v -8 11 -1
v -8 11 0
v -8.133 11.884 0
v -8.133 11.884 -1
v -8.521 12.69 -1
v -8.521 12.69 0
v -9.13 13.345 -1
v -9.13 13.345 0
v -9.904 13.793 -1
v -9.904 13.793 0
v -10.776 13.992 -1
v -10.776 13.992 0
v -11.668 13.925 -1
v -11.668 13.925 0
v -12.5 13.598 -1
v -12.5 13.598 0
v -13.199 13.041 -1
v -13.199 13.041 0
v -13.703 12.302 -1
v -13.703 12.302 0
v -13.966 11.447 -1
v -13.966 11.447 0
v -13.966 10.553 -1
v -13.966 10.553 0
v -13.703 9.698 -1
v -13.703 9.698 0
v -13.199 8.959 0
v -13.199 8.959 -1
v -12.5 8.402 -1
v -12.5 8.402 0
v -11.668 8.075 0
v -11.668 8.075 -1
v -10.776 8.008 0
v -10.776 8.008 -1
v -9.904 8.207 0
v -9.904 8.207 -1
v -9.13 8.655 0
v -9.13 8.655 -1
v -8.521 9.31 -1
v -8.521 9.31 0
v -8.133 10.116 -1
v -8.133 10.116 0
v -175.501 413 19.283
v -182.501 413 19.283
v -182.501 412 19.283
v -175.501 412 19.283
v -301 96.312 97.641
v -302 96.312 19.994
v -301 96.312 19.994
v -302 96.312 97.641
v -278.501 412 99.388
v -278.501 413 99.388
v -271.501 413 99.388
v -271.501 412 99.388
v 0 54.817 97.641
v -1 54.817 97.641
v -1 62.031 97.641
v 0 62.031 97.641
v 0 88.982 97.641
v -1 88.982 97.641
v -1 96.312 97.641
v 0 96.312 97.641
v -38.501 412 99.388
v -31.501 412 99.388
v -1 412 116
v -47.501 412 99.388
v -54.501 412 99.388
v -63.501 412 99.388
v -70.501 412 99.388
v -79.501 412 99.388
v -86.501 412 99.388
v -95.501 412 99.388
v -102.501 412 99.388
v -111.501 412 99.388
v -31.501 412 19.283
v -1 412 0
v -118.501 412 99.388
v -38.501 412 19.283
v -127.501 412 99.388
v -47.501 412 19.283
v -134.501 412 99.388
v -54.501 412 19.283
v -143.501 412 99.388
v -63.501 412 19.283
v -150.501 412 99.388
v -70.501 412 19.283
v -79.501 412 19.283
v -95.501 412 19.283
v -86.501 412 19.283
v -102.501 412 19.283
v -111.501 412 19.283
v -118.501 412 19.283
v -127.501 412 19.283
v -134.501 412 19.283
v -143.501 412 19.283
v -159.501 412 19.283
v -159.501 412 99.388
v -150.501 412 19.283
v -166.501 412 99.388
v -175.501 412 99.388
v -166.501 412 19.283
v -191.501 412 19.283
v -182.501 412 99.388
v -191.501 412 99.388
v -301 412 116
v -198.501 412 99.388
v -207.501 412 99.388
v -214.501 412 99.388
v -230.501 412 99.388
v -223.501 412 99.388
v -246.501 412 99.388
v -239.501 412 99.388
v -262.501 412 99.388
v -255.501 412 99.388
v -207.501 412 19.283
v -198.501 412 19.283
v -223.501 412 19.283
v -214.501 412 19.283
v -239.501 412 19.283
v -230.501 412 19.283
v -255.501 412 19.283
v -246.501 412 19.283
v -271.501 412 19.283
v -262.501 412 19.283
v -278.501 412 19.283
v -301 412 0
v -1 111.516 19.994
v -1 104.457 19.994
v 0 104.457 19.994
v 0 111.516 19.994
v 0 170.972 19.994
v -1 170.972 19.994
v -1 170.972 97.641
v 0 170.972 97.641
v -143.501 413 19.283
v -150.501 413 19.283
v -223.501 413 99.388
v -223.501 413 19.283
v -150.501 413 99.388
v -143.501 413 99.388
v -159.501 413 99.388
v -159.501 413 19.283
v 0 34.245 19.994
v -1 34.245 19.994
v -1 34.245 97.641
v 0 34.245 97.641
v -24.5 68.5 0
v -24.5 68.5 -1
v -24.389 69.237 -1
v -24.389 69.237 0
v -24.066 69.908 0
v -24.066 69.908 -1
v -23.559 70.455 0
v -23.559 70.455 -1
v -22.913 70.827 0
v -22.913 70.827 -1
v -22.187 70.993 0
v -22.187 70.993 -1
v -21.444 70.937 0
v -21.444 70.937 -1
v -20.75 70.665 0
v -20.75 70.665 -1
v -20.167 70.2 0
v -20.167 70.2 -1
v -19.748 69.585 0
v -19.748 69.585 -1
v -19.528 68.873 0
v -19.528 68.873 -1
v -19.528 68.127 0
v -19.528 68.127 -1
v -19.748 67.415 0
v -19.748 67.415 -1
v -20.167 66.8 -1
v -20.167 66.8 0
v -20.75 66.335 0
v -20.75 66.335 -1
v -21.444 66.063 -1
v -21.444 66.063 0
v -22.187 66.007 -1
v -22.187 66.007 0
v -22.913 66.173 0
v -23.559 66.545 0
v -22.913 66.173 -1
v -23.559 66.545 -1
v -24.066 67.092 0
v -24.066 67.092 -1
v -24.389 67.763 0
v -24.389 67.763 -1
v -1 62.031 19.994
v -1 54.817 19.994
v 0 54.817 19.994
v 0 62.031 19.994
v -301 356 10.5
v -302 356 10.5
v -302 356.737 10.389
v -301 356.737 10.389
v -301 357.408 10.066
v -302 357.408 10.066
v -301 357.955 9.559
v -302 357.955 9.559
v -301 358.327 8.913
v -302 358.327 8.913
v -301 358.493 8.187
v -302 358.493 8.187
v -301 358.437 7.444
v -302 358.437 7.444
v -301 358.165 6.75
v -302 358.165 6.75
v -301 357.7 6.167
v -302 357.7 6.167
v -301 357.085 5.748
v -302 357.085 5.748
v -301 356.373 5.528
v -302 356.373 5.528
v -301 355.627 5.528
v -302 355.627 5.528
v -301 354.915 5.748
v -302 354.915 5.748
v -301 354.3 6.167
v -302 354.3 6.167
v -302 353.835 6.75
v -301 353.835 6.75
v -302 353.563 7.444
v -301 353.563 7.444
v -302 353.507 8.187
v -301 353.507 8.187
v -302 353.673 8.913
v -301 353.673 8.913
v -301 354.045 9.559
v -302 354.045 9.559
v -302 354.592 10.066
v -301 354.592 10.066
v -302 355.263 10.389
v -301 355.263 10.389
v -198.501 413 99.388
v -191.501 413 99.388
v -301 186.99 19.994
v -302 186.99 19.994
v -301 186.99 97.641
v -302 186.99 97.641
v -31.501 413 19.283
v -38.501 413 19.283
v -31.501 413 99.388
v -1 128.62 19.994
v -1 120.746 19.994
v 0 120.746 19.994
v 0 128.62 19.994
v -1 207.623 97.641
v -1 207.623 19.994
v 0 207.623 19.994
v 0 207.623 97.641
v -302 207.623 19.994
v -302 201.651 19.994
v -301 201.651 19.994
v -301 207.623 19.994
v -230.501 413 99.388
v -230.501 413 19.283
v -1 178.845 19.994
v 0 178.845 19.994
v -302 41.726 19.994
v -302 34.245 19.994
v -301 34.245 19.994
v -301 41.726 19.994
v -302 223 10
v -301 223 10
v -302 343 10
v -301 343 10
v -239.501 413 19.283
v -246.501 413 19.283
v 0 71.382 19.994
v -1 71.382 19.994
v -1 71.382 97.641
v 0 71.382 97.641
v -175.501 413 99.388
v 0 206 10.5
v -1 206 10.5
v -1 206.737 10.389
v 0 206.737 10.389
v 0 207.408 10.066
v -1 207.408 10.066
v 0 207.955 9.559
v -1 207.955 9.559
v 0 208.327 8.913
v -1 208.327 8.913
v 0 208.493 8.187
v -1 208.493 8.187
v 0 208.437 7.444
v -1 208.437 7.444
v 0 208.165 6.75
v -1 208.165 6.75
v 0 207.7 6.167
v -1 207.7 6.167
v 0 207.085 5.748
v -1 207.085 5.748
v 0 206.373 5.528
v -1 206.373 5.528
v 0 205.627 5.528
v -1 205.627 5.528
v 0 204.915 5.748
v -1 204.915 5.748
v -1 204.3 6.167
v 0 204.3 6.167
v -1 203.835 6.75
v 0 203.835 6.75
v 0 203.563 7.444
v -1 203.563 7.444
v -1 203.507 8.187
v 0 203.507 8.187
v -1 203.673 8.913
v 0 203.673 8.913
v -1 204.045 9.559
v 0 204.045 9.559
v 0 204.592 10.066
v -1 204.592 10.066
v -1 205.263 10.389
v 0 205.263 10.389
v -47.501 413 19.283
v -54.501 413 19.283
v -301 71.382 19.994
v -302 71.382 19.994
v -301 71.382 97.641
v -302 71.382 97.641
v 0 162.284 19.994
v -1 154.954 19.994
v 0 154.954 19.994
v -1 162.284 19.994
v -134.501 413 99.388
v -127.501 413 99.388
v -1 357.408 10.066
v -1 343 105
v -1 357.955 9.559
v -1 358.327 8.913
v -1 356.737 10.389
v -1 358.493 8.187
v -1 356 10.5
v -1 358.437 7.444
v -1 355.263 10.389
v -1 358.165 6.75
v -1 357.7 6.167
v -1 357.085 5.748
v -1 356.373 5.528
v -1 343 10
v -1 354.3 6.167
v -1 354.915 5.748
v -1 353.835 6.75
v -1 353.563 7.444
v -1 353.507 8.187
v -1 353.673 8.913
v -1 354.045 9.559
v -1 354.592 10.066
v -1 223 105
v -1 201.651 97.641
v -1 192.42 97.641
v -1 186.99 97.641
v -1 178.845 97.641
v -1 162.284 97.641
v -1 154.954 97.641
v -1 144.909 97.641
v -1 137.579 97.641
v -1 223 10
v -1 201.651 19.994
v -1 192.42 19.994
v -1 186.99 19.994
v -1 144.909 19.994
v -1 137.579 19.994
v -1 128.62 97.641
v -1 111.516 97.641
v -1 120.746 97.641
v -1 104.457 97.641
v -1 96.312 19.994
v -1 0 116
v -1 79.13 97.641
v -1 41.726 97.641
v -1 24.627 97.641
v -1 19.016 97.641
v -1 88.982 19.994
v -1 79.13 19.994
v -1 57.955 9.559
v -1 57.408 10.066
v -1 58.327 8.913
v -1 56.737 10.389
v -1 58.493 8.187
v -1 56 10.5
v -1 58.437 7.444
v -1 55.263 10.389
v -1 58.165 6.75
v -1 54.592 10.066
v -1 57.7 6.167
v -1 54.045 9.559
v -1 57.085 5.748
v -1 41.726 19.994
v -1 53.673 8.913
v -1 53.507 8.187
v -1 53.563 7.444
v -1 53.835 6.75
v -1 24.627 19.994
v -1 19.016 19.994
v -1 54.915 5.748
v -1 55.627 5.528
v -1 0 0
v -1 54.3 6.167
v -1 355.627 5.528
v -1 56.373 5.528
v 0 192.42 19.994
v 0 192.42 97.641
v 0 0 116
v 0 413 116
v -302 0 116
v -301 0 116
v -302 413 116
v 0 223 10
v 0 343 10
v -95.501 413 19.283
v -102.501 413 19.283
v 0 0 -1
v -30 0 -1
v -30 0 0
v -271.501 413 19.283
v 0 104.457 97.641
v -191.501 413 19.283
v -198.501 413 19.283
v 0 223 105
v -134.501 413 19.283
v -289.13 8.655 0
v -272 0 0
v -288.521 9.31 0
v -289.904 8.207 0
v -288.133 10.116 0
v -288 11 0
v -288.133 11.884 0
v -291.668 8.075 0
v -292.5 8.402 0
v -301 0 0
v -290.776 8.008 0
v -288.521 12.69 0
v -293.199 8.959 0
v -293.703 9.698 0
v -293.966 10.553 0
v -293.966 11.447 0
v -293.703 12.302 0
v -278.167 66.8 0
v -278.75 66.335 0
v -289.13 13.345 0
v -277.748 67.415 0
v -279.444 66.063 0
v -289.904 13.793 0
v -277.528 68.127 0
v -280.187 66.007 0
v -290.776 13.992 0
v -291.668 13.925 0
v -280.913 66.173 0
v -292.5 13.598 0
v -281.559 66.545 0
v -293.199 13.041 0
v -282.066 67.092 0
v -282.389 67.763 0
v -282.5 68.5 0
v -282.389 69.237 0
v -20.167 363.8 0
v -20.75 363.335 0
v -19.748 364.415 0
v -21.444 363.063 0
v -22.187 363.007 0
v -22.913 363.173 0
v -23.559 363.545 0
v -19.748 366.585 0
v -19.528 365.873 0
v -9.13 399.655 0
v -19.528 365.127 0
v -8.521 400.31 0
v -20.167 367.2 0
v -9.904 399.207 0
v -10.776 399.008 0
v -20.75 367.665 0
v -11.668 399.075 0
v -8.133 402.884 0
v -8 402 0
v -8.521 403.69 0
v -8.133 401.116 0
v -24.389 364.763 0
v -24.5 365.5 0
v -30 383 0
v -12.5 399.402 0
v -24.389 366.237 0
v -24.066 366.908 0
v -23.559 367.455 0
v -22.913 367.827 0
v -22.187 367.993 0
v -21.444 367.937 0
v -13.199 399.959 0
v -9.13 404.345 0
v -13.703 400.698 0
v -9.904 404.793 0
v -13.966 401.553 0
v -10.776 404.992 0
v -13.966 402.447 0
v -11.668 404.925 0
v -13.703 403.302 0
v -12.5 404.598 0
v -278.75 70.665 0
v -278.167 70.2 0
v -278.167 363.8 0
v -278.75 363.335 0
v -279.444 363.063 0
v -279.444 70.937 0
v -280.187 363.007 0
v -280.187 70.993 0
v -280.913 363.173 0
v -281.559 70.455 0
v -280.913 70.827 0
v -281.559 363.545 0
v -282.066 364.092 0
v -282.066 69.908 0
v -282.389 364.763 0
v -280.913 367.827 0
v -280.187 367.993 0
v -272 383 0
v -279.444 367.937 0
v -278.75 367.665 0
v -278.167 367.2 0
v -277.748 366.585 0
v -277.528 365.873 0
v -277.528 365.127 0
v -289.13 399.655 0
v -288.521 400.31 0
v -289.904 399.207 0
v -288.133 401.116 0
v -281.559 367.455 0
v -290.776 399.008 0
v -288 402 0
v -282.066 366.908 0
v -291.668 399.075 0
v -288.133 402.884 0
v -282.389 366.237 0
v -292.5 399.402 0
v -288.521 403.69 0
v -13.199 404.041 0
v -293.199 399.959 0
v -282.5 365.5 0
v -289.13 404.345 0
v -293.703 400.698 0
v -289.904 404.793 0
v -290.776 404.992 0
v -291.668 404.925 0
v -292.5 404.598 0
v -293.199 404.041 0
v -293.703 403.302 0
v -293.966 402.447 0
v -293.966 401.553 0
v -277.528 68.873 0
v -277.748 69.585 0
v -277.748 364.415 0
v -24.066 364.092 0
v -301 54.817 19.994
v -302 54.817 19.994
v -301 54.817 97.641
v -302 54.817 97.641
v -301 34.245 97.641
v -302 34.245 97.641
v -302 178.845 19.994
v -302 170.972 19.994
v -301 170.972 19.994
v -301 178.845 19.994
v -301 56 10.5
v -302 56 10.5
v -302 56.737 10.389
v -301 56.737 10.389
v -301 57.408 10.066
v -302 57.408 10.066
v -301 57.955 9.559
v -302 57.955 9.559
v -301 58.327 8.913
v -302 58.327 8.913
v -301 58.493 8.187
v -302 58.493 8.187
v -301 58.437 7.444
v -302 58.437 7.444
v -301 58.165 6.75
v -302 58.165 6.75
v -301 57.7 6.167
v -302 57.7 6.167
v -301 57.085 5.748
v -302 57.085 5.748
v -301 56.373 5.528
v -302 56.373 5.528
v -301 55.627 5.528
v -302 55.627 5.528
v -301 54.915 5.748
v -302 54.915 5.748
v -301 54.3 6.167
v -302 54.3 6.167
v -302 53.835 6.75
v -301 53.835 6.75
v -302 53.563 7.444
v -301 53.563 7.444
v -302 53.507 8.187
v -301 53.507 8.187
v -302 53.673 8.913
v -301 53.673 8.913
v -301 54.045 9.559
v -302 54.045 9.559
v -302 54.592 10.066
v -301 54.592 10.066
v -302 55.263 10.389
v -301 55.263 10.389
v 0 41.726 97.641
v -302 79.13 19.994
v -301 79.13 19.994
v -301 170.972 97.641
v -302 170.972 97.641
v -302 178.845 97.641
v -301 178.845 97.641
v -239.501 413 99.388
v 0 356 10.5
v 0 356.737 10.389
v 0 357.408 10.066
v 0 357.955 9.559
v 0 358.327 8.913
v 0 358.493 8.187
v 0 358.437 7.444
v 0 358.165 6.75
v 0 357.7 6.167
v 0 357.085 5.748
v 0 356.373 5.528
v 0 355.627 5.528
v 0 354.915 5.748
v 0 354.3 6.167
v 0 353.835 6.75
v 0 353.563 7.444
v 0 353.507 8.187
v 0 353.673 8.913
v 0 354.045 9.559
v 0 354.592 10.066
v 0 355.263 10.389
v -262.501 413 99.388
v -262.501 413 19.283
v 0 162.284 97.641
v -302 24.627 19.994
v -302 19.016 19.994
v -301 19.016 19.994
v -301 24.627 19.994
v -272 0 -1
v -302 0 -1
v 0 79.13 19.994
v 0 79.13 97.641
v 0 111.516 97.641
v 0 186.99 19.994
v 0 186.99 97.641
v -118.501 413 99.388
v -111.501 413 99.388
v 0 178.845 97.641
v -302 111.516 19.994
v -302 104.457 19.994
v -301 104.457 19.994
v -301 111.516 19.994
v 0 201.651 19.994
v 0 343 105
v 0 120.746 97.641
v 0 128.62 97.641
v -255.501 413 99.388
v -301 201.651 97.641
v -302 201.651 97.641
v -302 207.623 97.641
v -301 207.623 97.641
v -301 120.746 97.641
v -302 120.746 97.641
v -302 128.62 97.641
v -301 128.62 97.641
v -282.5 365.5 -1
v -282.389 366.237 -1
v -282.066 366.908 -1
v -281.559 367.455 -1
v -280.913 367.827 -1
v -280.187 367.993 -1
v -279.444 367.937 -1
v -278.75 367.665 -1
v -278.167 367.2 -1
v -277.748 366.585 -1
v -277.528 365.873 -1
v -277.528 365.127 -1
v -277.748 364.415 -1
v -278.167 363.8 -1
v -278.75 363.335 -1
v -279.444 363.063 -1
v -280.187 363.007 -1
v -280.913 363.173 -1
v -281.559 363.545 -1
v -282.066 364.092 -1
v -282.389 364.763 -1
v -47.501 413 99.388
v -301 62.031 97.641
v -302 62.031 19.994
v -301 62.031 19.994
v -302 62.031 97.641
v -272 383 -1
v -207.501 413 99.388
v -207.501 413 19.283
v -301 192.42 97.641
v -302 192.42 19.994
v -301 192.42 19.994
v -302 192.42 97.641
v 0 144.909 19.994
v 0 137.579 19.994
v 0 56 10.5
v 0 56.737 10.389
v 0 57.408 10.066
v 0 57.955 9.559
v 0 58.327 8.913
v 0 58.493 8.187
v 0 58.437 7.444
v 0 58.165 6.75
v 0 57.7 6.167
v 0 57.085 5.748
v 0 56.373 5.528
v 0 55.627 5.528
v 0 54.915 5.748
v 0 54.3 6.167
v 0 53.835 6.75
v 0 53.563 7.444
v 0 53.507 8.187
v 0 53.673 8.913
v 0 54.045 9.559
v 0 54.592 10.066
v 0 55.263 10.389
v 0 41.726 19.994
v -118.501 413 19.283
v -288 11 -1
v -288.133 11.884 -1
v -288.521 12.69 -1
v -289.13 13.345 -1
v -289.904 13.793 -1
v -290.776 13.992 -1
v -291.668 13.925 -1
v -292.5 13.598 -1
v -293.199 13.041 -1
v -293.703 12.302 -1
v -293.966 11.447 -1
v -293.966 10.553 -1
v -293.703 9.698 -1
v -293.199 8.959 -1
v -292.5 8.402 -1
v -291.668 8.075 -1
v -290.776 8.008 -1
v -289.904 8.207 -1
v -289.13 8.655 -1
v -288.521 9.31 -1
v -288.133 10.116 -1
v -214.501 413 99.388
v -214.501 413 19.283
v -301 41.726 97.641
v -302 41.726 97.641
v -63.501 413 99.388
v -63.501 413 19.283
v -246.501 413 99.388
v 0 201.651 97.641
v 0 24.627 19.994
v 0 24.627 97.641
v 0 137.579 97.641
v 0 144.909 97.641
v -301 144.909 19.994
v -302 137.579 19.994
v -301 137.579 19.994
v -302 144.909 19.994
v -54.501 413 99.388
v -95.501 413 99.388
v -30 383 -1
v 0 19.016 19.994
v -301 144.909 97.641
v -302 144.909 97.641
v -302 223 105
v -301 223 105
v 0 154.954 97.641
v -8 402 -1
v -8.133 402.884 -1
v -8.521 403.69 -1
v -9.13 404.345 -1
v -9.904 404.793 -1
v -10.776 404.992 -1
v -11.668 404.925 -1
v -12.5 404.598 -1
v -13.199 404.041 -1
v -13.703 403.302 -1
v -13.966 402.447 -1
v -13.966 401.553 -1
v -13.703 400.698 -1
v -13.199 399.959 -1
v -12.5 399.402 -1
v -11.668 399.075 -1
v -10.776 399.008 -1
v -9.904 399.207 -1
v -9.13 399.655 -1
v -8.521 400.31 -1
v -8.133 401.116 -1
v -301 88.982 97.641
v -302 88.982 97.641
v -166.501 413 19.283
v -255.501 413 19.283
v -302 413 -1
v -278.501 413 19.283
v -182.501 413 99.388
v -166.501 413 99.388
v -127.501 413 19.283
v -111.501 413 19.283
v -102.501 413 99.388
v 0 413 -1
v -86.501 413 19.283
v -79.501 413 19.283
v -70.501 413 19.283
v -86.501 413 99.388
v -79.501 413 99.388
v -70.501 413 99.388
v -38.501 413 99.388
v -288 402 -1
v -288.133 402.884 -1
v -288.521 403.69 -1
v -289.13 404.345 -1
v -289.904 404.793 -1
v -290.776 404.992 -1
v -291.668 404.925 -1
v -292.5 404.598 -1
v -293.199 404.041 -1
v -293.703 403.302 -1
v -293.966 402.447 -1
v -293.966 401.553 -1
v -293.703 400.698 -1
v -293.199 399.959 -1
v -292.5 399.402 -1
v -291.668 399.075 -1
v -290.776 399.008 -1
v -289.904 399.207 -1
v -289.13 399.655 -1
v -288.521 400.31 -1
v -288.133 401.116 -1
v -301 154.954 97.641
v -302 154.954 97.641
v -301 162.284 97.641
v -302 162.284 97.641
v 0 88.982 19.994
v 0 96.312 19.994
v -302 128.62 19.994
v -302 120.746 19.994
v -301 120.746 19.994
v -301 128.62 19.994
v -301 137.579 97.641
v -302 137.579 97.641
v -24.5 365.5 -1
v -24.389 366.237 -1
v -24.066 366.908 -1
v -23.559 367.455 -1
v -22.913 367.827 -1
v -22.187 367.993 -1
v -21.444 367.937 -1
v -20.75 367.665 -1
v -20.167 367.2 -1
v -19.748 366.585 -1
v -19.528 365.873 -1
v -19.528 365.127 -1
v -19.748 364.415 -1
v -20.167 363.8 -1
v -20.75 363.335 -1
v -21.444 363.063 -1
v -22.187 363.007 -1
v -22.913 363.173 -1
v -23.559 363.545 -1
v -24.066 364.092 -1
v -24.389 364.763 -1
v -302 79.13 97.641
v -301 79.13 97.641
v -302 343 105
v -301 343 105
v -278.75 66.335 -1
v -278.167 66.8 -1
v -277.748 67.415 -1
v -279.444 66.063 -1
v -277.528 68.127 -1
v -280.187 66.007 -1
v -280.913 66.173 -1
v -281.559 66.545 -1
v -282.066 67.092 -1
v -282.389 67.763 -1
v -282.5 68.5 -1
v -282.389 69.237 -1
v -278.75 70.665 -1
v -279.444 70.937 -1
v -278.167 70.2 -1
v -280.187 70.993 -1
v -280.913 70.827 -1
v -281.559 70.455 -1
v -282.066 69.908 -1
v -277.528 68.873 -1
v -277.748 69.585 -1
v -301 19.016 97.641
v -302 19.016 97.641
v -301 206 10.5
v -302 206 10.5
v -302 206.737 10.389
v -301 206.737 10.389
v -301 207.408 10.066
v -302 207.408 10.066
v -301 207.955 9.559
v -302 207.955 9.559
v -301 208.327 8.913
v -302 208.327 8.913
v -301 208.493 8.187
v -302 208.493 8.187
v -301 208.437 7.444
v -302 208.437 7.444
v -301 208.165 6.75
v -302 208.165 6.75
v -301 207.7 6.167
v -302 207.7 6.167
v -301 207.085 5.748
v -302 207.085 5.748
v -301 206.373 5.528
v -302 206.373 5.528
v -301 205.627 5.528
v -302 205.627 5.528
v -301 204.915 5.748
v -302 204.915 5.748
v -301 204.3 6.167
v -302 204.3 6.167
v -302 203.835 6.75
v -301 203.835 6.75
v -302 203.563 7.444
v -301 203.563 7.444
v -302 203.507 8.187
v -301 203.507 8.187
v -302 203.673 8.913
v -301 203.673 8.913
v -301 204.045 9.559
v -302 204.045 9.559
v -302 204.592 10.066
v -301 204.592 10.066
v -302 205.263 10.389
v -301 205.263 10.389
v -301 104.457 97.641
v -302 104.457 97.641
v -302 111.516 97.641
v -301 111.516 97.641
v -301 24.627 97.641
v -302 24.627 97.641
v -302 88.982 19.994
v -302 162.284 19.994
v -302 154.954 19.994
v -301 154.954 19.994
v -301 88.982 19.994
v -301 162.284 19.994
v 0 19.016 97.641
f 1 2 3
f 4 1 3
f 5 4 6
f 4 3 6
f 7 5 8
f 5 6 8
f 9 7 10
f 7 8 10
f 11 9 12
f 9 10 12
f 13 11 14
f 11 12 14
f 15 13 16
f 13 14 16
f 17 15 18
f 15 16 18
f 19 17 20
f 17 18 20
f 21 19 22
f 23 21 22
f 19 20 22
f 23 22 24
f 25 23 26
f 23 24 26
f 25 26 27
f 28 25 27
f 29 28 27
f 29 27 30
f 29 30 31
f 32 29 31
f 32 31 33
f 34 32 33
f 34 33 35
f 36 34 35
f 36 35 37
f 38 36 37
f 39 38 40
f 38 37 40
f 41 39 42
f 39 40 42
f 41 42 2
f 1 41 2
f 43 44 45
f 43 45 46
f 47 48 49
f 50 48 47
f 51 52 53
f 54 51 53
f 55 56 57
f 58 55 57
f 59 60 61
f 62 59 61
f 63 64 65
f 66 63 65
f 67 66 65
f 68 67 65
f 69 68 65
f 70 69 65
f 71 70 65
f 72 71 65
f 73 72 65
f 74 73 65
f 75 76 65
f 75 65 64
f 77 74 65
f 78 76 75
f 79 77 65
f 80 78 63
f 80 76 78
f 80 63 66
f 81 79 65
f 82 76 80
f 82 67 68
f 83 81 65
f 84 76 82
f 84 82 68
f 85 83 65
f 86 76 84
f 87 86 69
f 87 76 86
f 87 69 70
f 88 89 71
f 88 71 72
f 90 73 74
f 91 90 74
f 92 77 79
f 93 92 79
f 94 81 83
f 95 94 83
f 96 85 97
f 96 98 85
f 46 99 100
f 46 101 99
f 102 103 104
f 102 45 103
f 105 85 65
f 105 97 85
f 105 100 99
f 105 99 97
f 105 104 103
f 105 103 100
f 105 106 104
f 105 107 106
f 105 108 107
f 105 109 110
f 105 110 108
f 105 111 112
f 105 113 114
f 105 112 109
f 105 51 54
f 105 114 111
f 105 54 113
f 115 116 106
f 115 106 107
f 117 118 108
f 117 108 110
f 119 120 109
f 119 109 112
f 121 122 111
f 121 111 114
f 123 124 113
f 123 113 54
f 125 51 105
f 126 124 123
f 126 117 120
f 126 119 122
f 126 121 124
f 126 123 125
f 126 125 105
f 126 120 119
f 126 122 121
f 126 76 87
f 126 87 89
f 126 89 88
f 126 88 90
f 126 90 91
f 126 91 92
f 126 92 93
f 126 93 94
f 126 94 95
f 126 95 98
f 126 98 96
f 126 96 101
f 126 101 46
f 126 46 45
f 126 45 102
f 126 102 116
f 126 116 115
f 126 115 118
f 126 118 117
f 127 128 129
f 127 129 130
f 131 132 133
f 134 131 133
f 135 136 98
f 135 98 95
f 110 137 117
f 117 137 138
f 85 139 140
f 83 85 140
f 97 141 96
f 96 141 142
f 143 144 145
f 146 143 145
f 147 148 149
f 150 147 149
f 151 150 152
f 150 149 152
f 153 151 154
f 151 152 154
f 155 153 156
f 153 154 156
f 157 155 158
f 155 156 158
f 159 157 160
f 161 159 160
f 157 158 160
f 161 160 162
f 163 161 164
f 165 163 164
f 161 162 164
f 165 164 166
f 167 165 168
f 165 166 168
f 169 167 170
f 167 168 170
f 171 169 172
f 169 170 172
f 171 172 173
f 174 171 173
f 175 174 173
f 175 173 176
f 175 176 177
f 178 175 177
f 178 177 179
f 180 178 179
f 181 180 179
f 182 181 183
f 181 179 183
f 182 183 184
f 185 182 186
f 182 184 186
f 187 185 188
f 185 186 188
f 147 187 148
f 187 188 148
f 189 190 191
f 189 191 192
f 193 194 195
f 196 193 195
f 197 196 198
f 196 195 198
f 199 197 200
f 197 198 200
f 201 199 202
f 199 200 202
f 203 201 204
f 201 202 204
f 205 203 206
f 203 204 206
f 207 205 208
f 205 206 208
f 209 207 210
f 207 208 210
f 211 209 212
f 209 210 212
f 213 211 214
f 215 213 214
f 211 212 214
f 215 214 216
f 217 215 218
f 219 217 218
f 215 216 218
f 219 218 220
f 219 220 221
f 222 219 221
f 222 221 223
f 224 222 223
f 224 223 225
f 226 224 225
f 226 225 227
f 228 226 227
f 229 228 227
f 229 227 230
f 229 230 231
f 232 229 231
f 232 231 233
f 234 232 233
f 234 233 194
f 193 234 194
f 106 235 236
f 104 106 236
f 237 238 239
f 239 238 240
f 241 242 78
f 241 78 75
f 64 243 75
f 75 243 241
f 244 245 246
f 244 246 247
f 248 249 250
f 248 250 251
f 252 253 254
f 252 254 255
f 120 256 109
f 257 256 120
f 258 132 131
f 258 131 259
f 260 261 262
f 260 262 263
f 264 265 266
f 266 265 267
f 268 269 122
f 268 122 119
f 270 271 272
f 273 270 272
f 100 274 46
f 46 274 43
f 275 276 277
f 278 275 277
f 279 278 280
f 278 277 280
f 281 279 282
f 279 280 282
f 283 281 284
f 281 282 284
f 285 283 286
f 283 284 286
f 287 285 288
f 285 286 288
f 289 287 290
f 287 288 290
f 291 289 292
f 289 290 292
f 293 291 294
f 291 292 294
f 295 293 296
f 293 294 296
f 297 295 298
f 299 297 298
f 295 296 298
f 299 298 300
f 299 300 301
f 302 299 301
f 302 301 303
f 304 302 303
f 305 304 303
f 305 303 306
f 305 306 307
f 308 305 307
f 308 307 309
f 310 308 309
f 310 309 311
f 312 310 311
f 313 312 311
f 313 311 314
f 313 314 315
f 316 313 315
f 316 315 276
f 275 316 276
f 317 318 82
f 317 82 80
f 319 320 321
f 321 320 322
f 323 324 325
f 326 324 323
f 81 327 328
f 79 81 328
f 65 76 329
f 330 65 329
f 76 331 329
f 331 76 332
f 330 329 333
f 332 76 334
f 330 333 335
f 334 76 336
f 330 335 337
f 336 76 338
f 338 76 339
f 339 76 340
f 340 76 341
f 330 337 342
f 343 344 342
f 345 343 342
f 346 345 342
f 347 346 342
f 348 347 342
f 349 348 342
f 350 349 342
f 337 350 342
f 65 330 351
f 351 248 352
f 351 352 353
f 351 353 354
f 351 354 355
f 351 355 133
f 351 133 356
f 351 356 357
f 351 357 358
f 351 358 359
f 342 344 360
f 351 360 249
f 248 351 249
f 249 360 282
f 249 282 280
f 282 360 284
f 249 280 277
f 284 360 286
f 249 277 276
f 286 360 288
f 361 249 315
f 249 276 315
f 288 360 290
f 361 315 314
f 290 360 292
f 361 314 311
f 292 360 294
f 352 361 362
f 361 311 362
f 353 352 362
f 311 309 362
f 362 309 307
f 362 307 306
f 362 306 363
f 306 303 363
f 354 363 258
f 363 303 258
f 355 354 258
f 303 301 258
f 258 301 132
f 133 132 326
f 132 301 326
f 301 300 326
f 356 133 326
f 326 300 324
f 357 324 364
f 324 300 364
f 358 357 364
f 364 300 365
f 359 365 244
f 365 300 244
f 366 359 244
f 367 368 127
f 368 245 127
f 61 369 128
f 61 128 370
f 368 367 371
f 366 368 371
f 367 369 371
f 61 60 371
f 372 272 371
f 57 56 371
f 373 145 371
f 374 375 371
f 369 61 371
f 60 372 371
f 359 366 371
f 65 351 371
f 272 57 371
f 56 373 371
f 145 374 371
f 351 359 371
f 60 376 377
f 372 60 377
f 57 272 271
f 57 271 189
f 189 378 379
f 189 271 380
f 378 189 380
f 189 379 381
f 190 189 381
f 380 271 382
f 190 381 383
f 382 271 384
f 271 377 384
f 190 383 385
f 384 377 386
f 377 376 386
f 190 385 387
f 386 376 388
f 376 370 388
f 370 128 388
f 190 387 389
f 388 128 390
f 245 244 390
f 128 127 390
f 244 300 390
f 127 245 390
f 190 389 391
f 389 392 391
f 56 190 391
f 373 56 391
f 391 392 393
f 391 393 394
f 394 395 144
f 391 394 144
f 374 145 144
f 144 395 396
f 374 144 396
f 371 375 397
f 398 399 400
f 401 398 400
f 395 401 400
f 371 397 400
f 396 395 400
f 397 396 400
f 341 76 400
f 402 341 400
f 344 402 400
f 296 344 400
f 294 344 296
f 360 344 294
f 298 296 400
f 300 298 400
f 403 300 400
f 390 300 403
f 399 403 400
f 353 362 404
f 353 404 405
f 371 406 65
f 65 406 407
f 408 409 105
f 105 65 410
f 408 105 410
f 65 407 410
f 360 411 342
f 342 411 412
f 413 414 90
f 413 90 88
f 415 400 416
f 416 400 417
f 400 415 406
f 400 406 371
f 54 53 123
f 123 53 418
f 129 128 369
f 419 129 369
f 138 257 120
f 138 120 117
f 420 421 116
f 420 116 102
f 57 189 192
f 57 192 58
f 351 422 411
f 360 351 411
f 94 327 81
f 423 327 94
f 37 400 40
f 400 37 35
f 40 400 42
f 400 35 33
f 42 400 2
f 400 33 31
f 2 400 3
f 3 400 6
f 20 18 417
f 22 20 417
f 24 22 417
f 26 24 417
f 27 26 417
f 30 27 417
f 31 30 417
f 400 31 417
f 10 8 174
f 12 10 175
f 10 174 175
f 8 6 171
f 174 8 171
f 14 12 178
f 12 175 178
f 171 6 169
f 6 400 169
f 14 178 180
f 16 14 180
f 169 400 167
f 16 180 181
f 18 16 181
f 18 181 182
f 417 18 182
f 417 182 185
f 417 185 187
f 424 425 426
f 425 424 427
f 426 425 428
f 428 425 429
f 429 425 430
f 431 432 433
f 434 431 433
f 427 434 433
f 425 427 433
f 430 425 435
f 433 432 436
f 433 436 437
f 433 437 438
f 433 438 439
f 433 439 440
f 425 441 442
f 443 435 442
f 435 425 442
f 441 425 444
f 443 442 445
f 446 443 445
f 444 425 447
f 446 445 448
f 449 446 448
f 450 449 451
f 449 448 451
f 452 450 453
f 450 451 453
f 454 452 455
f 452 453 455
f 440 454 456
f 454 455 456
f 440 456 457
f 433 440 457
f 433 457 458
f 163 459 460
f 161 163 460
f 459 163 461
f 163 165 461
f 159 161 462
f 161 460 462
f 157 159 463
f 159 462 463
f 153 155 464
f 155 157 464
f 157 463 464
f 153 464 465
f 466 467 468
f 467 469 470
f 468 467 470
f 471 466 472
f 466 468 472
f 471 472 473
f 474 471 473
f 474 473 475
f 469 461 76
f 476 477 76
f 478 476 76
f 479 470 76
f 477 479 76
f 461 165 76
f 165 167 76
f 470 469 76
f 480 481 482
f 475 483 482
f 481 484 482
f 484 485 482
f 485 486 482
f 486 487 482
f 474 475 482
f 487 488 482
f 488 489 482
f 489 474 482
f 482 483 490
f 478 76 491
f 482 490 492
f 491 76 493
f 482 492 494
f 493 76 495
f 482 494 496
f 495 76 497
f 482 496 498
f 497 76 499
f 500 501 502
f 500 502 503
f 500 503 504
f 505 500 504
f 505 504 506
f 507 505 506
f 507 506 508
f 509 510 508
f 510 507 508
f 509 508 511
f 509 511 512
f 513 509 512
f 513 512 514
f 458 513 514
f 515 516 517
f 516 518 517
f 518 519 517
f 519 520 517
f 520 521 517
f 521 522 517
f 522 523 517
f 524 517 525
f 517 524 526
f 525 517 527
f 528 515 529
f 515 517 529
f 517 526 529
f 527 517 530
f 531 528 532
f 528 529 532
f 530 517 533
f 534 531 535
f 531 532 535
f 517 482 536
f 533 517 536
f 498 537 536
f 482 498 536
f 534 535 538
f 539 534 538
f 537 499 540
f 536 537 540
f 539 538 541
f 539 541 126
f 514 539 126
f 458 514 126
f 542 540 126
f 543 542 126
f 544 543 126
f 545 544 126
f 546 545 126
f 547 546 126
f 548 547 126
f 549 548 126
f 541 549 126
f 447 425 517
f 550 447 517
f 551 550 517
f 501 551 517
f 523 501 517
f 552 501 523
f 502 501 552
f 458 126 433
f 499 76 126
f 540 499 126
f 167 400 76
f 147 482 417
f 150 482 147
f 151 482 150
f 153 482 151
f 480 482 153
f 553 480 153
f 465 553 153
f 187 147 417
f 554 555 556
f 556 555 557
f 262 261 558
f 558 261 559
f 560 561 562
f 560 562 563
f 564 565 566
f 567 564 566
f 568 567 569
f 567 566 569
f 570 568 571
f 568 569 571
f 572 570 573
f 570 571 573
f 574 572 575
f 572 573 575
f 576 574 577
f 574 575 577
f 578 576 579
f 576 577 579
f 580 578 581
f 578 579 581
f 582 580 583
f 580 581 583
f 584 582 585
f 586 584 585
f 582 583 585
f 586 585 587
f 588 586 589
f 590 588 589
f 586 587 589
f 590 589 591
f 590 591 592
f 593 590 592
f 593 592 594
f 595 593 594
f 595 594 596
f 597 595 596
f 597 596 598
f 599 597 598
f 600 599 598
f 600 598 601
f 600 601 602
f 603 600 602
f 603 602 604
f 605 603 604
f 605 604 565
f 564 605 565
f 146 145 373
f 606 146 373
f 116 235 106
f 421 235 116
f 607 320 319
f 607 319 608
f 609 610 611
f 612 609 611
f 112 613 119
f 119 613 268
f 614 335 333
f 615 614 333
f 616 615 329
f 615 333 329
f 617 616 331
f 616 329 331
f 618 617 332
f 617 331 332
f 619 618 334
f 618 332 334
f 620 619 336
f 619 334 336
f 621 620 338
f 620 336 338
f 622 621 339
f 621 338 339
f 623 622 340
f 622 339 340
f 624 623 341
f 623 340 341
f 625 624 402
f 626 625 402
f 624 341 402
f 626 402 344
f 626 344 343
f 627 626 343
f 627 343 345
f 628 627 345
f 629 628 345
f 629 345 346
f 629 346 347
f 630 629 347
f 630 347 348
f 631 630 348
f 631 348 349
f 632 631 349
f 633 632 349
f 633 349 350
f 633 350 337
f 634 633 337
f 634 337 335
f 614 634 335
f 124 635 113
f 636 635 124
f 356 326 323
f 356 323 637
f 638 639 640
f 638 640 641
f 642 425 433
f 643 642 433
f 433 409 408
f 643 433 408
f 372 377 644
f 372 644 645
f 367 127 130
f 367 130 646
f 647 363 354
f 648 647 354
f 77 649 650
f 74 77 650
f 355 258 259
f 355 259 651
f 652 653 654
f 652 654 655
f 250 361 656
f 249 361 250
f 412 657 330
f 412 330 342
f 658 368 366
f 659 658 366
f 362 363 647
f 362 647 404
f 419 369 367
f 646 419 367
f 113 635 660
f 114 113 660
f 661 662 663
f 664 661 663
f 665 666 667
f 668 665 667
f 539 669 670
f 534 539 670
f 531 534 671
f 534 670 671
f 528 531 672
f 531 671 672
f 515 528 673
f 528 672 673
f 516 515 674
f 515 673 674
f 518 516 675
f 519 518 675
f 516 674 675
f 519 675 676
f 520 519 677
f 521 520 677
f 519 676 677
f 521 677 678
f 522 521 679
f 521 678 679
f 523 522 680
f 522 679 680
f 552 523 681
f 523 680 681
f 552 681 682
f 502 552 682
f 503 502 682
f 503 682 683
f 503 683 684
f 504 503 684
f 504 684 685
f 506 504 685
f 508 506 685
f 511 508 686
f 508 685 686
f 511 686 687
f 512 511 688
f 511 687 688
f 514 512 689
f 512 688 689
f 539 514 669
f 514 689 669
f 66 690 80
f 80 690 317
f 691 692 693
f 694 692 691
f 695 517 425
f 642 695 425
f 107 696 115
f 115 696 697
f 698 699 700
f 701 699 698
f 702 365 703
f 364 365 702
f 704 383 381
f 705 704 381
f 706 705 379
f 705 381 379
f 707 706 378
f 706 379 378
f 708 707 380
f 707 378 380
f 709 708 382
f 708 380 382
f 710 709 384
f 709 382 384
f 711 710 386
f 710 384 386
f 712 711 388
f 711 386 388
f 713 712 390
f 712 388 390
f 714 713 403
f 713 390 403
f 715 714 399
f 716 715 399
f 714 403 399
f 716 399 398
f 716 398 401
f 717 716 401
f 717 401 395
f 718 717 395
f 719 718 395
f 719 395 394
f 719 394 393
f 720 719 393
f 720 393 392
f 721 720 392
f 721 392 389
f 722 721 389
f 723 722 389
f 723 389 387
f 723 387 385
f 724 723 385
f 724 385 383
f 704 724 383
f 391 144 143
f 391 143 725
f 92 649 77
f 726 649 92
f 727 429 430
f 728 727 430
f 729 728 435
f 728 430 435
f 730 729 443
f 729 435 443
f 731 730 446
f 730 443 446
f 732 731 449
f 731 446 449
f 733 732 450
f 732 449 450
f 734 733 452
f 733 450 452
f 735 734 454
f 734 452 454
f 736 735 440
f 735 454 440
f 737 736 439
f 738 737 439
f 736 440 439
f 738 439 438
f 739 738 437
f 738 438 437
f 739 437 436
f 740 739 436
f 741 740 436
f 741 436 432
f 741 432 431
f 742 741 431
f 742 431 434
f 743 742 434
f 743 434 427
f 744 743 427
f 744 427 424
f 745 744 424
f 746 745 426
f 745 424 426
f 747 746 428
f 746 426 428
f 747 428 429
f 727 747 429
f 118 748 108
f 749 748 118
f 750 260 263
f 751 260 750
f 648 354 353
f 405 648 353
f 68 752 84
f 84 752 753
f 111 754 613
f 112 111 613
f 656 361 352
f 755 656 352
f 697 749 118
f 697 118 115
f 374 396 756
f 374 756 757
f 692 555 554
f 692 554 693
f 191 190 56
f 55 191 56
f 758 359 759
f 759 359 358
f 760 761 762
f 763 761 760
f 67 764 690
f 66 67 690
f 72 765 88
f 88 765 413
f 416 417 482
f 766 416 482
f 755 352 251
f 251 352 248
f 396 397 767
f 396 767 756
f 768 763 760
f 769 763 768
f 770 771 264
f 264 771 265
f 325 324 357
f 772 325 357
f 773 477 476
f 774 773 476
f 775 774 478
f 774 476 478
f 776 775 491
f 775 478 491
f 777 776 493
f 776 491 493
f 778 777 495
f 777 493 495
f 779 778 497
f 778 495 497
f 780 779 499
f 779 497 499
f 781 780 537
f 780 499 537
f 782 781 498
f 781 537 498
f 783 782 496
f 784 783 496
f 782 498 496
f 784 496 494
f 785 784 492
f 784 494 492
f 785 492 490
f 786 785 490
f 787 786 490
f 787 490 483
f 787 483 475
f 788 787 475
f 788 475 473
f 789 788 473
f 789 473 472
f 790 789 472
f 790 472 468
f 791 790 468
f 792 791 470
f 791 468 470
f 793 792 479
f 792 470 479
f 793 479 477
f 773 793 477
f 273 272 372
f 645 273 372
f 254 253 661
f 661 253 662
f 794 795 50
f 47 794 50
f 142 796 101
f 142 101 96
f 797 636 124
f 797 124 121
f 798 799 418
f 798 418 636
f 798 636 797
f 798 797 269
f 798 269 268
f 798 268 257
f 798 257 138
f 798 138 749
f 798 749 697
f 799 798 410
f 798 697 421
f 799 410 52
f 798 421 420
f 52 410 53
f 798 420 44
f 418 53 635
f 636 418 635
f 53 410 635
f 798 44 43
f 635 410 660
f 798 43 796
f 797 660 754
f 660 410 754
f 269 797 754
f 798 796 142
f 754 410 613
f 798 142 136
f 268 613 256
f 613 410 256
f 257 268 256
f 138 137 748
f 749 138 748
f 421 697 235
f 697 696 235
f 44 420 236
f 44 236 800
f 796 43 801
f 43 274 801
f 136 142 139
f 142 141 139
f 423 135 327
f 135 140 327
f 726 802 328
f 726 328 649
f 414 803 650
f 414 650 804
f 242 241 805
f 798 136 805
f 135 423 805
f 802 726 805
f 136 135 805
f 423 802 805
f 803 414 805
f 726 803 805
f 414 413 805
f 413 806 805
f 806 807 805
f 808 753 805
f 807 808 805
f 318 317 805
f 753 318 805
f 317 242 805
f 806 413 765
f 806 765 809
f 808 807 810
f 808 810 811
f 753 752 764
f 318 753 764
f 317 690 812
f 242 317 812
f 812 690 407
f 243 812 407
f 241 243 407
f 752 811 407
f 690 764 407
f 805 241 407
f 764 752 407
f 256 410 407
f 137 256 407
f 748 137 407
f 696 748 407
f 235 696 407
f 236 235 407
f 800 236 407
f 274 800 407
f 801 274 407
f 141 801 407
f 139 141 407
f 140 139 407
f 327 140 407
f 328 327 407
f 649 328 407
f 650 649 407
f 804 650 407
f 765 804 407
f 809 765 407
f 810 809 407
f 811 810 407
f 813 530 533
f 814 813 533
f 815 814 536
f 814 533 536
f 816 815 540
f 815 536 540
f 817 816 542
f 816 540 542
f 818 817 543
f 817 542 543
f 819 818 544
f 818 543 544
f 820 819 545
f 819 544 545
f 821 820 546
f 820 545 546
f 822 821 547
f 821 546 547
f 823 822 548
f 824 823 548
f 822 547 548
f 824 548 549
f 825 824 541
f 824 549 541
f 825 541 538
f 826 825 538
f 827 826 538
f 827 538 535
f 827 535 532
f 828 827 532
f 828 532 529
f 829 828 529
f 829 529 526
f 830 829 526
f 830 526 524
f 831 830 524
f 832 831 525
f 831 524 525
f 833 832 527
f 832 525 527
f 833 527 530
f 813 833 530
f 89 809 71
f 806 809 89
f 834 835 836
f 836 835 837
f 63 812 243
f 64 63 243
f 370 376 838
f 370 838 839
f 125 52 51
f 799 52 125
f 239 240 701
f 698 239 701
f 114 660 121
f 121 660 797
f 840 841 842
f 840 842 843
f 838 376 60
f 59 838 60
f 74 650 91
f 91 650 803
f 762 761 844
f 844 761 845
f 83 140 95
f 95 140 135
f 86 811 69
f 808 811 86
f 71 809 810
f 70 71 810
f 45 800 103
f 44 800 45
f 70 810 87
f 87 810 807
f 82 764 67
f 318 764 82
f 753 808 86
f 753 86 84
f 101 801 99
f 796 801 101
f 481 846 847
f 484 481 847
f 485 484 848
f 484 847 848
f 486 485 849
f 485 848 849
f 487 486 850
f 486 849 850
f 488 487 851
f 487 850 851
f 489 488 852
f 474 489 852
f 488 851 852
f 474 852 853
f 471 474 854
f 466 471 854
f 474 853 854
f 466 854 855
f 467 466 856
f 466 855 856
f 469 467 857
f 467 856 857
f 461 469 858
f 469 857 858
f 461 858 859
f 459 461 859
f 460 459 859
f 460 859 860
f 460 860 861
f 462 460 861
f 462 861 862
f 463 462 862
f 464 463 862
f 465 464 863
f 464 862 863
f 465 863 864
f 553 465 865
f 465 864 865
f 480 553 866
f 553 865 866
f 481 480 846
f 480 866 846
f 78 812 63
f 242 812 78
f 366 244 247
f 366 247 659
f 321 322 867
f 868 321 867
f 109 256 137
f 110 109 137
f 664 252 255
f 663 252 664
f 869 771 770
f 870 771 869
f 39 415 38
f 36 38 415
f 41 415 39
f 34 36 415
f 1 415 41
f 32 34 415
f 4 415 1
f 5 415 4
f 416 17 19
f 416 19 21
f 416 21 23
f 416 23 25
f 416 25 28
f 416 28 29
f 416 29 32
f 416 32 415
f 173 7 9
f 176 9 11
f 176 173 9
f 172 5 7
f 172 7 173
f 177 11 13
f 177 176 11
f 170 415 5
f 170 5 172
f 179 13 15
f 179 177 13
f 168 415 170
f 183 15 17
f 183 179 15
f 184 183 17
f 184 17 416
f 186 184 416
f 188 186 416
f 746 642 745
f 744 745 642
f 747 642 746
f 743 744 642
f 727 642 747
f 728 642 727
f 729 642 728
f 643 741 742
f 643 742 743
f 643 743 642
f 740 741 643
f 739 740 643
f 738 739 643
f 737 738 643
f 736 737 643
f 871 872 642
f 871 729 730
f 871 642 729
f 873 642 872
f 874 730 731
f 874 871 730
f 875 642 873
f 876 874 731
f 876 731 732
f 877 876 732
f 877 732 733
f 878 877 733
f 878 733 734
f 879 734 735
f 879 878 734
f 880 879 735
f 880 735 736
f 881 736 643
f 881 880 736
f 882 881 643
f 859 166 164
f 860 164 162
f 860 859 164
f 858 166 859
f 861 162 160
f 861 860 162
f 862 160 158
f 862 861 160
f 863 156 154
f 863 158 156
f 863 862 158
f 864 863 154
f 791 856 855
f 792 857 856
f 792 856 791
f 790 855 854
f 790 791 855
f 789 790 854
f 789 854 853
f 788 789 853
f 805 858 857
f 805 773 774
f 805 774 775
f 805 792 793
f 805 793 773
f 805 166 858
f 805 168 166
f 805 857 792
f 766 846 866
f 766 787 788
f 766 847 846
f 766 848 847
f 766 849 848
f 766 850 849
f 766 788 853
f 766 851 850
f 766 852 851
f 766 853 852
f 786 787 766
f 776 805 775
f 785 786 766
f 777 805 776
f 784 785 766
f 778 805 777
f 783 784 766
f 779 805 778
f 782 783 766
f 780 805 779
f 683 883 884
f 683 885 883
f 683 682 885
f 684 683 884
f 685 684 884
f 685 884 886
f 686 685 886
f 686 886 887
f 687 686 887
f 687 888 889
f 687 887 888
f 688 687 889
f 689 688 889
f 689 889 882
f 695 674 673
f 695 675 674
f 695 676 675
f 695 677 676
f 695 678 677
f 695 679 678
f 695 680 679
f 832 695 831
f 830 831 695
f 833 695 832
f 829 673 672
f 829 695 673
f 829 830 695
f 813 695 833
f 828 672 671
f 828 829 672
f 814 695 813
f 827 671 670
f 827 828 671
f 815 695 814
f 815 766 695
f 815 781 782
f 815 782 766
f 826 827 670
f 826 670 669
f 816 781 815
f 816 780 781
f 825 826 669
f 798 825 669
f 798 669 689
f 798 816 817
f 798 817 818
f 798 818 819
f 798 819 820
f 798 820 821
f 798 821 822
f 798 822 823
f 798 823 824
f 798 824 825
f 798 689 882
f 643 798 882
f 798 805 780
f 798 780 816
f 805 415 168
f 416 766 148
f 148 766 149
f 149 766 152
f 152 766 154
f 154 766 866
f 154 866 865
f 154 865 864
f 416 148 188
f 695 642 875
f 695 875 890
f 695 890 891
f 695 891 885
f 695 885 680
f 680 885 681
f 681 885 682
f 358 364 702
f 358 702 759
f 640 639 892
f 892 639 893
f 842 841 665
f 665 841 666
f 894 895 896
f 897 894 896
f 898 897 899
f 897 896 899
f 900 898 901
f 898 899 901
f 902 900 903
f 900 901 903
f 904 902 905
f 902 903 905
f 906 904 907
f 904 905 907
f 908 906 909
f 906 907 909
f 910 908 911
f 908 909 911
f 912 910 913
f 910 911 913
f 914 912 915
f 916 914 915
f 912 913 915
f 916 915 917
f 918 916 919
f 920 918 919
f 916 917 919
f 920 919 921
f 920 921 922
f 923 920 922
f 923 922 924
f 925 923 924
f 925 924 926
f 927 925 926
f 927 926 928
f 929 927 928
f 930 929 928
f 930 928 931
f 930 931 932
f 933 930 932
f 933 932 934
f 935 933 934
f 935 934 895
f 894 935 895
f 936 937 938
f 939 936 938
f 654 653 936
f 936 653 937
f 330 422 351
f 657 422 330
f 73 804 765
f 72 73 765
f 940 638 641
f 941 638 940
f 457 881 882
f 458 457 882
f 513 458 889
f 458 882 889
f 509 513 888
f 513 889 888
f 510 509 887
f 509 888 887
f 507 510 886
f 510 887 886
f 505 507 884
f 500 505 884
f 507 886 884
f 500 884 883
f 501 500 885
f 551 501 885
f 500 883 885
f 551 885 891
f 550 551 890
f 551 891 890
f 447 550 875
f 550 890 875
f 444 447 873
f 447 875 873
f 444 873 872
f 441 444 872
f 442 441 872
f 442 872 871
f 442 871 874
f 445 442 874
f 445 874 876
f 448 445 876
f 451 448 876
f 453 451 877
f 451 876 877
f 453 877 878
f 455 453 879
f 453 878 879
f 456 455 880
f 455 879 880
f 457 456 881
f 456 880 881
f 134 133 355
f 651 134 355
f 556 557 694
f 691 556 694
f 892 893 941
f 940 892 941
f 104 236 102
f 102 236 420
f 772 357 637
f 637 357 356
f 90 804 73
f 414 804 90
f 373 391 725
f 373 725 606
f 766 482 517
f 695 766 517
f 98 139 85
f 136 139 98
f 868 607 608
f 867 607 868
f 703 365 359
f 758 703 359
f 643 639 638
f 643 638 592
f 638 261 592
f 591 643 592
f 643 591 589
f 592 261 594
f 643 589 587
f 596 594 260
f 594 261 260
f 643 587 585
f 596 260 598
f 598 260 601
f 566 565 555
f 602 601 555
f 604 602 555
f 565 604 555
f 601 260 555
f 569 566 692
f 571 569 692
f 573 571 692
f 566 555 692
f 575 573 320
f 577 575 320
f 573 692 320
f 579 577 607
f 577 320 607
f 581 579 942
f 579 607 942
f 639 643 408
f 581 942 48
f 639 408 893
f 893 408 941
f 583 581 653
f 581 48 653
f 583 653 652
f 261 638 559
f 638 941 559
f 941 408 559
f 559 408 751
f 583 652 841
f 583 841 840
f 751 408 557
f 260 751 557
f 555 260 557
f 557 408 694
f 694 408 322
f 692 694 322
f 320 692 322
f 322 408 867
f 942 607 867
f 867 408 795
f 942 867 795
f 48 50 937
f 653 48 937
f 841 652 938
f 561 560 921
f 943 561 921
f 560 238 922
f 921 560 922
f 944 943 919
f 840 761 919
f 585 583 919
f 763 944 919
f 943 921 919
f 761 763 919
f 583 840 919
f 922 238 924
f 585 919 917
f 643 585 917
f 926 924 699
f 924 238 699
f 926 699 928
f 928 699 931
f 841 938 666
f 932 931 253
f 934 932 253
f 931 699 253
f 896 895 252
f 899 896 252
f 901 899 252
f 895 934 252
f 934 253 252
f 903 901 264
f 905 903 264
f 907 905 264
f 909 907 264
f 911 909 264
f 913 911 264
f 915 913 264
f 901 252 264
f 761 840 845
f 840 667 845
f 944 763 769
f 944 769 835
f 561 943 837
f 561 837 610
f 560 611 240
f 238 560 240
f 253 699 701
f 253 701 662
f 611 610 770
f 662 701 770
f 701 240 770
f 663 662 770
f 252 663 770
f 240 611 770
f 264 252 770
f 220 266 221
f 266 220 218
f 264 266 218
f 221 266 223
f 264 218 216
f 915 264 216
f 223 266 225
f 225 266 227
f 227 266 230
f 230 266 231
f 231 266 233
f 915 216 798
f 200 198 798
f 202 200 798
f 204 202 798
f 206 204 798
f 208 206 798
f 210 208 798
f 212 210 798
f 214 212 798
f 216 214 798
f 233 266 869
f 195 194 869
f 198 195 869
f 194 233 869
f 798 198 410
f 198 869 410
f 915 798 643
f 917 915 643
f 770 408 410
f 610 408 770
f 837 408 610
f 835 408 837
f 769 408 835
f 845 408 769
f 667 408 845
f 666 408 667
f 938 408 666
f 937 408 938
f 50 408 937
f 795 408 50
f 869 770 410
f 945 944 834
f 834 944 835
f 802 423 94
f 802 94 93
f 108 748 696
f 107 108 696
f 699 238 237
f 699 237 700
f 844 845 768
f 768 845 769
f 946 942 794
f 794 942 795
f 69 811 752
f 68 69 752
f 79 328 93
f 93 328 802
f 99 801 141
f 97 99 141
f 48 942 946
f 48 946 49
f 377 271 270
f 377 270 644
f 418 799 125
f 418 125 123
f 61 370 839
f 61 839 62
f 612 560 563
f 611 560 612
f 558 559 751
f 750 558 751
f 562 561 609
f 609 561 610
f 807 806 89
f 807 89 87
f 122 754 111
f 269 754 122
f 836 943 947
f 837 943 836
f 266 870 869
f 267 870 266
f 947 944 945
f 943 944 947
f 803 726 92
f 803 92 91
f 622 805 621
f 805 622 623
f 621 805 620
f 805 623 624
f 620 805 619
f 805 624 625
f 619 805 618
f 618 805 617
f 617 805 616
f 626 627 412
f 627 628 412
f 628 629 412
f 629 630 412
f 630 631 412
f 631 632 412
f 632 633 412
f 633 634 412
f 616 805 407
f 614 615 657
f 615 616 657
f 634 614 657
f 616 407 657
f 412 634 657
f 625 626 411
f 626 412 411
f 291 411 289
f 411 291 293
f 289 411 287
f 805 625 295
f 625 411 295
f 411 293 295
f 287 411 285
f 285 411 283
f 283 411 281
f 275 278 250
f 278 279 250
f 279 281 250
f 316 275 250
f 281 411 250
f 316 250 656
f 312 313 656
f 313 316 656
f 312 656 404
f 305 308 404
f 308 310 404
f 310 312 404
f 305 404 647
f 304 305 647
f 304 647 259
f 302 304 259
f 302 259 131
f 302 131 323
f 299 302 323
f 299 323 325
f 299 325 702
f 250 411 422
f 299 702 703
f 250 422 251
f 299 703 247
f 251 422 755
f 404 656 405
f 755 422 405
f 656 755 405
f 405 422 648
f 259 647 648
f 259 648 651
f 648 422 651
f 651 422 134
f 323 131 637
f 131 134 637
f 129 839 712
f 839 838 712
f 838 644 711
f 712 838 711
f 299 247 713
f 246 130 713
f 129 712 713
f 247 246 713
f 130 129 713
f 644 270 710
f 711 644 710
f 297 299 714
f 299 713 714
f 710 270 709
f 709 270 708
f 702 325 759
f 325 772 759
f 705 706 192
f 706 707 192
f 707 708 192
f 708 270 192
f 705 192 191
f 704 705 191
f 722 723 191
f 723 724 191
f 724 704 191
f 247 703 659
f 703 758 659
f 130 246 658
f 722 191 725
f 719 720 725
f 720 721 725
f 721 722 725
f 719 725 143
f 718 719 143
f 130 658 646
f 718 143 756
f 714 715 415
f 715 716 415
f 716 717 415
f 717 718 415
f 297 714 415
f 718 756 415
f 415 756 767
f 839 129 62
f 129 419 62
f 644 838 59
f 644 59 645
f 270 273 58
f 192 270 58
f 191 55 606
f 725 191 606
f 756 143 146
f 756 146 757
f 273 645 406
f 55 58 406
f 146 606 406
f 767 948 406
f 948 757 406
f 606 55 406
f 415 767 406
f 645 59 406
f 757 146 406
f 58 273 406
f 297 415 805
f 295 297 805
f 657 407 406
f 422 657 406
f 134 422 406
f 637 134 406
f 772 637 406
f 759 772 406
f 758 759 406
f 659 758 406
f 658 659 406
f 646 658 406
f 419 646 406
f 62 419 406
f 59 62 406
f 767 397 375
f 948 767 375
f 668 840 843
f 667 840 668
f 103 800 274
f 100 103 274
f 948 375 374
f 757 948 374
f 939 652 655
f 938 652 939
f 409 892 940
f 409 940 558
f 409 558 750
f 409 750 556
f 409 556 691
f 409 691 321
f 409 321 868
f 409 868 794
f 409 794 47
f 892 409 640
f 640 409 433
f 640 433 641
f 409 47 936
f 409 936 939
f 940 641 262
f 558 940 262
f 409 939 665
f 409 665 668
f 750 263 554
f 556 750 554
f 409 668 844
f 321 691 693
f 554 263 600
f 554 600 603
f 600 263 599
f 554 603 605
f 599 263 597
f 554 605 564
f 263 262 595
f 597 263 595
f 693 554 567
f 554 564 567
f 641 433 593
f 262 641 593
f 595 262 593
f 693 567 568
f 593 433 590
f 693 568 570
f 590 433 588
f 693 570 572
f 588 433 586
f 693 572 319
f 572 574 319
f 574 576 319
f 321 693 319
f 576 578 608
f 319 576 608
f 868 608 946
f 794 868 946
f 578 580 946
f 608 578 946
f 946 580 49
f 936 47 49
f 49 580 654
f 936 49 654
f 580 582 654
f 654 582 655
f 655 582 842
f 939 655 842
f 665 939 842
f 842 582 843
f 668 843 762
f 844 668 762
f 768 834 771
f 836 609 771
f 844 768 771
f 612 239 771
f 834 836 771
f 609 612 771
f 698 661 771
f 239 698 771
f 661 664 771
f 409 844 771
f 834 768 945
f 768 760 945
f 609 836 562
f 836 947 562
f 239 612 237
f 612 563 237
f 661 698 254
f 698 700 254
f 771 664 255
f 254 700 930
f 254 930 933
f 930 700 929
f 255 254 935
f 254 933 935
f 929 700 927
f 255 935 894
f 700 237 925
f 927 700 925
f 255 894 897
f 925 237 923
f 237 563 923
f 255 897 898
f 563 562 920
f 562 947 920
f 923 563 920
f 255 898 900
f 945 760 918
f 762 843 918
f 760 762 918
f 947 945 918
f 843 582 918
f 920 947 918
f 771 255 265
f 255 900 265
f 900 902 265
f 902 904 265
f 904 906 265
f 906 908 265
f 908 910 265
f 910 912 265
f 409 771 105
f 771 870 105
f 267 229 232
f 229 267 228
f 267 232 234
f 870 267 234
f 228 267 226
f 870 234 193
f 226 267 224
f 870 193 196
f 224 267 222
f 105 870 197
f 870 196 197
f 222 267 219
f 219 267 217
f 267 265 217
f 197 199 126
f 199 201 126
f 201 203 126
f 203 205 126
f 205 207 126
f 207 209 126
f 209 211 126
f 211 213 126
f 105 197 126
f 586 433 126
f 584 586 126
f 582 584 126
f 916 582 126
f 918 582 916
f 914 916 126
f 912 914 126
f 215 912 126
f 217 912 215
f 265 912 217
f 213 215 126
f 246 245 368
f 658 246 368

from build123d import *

# Parameters (mm, degrees)
SALIENTE_EXTRUIR1_DEPTH = 116
SALIENTE_EXTRUIR2_DEPTH = 1
CROQUIS4_R              = 2.5
CORTAR_EXTRUIR1_DEPTH   = 1
CROQUIS8_W              = 77.646192771
CROQUIS8_H              = 5.972784059
CROQUIS8_H_2            = 5.429803691
CROQUIS8_H_3            = 7.873215351
CROQUIS8_H_4            = 7.330234982
CROQUIS8_H_5            = 7.058744797
CROQUIS8_H_6            = 7.74799772
CROQUIS8_H_7            = 7.21365305
CROQUIS8_H_8            = 7.480825385
CROQUIS8_H_9            = 5.610619039
CORTAR_EXTRUIR3_DEPTH   = 302
CROQUIS9_W              = 7
CROQUIS9_H              = 80.105332856
CORTAR_EXTRUIR4_DEPTH   = 1
CROQUIS10_W             = 7
CROQUIS10_H             = 80.105332856
CORTAR_EXTRUIR5_DEPTH   = 1
SALIENTE_EXTRUIR4_DEPTH = 1
CROQUIS12_W             = 95
CROQUIS12_H             = 120
CORTAR_EXTRUIR6_DEPTH   = 302
CROQUIS13_R             = 3
CORTAR_EXTRUIR7_DEPTH   = 1
CROQUIS14_R             = 2.5
CORTAR_EXTRUIR8_DEPTH   = 302


with BuildPart() as part:
    # Croquis1 → Saliente-Extruir1 (new body)
    with BuildSketch(Plane.XY):
        Polygon((-301, 1), (-301, 0), (-302, 0), (-302, 413), (0, 413), (0, 0), (-1, 0), (-1, 1), (-1, 412), (-301, 412), align=None)
    extrude(amount=SALIENTE_EXTRUIR1_DEPTH)

    # Croquis8 → Cortar-Extruir3 (cut)
    with BuildSketch(Plane.ZY.offset(302)):
        with Locations((58.817511247, 204.636952511)):
            Rectangle(CROQUIS8_W, CROQUIS8_H)
        with Locations((58.817511247, 189.704992363)):
            Rectangle(CROQUIS8_W, CROQUIS8_H_2)
        with Locations((58.817511247, 174.908777307)):
            Rectangle(CROQUIS8_W, CROQUIS8_H_3)
        with Locations((58.817511247, 158.619366236)):
            Rectangle(CROQUIS8_W, CROQUIS8_H_4)
        with Locations((58.817511247, 141.243994427)):
            Rectangle(CROQUIS8_W, CROQUIS8_H_4)
        with Locations((58.817511247, 124.683093172)):
            Rectangle(CROQUIS8_W, CROQUIS8_H_3)
        with Locations((58.817511247, 107.986446824)):
            Rectangle(CROQUIS8_W, CROQUIS8_H_5)
        with Locations((58.817511247, 92.647251399)):
            Rectangle(CROQUIS8_W, CROQUIS8_H_4)
        with Locations((58.817511247, 75.255702304)):
            Rectangle(CROQUIS8_W, CROQUIS8_H_6)
        with Locations((58.817511247, 58.423845187)):
            Rectangle(CROQUIS8_W, CROQUIS8_H_7)
        with Locations((58.817511247, 37.985161546)):
            Rectangle(CROQUIS8_W, CROQUIS8_H_8)
        with Locations((58.817511247, 21.821235267)):
            Rectangle(CROQUIS8_W, CROQUIS8_H_9)
    extrude(amount=-CORTAR_EXTRUIR3_DEPTH, mode=Mode.SUBTRACT)

    # Croquis9 → Cortar-Extruir4 (cut)
    with BuildSketch(Plane(origin=(0, 413, 0), x_dir=(1, 0, 0), z_dir=(0, 1, 0))):
        with Locations((-275.000988129, -59.335747211)):
            Rectangle(CROQUIS9_W, CROQUIS9_H)
        with Locations((-259.000988129, -59.335747211)):
            Rectangle(CROQUIS9_W, CROQUIS9_H)
        with Locations((-243.000988129, -59.335747211)):
            Rectangle(CROQUIS9_W, CROQUIS9_H)
        with Locations((-227.000988129, -59.335747211)):
            Rectangle(CROQUIS9_W, CROQUIS9_H)
        with Locations((-211.000988129, -59.335747211)):
            Rectangle(CROQUIS9_W, CROQUIS9_H)
        with Locations((-195.000988129, -59.335747211)):
            Rectangle(CROQUIS9_W, CROQUIS9_H)
        with Locations((-179.000988129, -59.335747211)):
            Rectangle(CROQUIS9_W, CROQUIS9_H)
        with Locations((-163.000988129, -59.335747211)):
            Rectangle(CROQUIS9_W, CROQUIS9_H)
    extrude(amount=-CORTAR_EXTRUIR4_DEPTH, mode=Mode.SUBTRACT)

    # Croquis10 → Cortar-Extruir5 (cut)
    with BuildSketch(Plane(origin=(0, 413, 0), x_dir=(1, 0, 0), z_dir=(0, 1, 0))):
        with Locations((-147.000988129, -59.335747211)):
            Rectangle(CROQUIS10_W, CROQUIS10_H)
        with Locations((-131.000988129, -59.335747211)):
            Rectangle(CROQUIS10_W, CROQUIS10_H)
        with Locations((-115.000988129, -59.335747211)):
            Rectangle(CROQUIS10_W, CROQUIS10_H)
        with Locations((-99.000988129, -59.335747211)):
            Rectangle(CROQUIS10_W, CROQUIS10_H)
        with Locations((-83.000988129, -59.335747211)):
            Rectangle(CROQUIS10_W, CROQUIS10_H)
        with Locations((-67.000988129, -59.335747211)):
            Rectangle(CROQUIS10_W, CROQUIS10_H)
        with Locations((-51.000988129, -59.335747211)):
            Rectangle(CROQUIS10_W, CROQUIS10_H)
        with Locations((-35.000988129, -59.335747211)):
            Rectangle(CROQUIS10_W, CROQUIS10_H)
    extrude(amount=-CORTAR_EXTRUIR5_DEPTH, mode=Mode.SUBTRACT)



with BuildPart() as body_2:
    # Croquis2 → Saliente-Extruir2 (new body)
    with BuildSketch(Plane(origin=(0, 0, 0), x_dir=(-1, 0, 0), z_dir=(0, 0, -1))):
        Polygon((30, 383), (272, 383), (272, 0), (301, 0), (301, 412), (1, 412), (1, 0), (30, 0), align=None)
    extrude(amount=SALIENTE_EXTRUIR2_DEPTH)

    # Croquis4 → Cortar-Extruir1 (cut)
    with BuildSketch(Plane(origin=(0, 0, -1), x_dir=(-1, 0, 0), z_dir=(0, 0, -1))):
        with Locations((22, 365.5)):
            Circle(CROQUIS4_R)
        with Locations((22, 68.5)):
            Circle(CROQUIS4_R)
        with Locations((280, 68.5)):
            Circle(CROQUIS4_R)
        with Locations((280, 365.5)):
            Circle(CROQUIS4_R)
    extrude(amount=-CORTAR_EXTRUIR1_DEPTH, mode=Mode.SUBTRACT)


with BuildPart() as part_1:
    add(part.part)

    add(body_2.part)  # Saliente-Extruir4 merges body 2
    # Croquis11 → Saliente-Extruir4 (add)
    with BuildSketch(Plane(origin=(0, 0, 0), x_dir=(-1, 0, 0), z_dir=(0, 0, -1))):
        Polygon((301, 0), (302, 0), (302, 412), (302, 413), (301, 413), (1, 413), (0, 413), (0, 412), (0, 0), (1, 0), (1, 412), (301, 412), align=None)
    extrude(amount=SALIENTE_EXTRUIR4_DEPTH)

    # Croquis12 → Cortar-Extruir6 (cut)
    with BuildSketch(Plane(origin=(0, 0, 0), x_dir=(0, 0, -1), z_dir=(1, 0, 0))):
        with Locations((-57.5, 283)):
            Rectangle(CROQUIS12_W, CROQUIS12_H)
    extrude(amount=-CORTAR_EXTRUIR6_DEPTH, mode=Mode.SUBTRACT)

    # Croquis13 → Cortar-Extruir7 (cut)
    with BuildSketch(Plane.XY):
        with Locations((-291, 402)):
            Circle(CROQUIS13_R)
        with Locations((-291, 11)):
            Circle(CROQUIS13_R)
        with Locations((-11, 11)):
            Circle(CROQUIS13_R)
        with Locations((-11, 402)):
            Circle(CROQUIS13_R)
    extrude(amount=-CORTAR_EXTRUIR7_DEPTH, mode=Mode.SUBTRACT)

    # Croquis14 → Cortar-Extruir8 (cut)
    with BuildSketch(Plane.ZY.offset(302)):
        with Locations((8, 356)):
            Circle(CROQUIS14_R)
        with Locations((8, 56)):
            Circle(CROQUIS14_R)
        with Locations((8, 206)):
            Circle(CROQUIS14_R)
    extrude(amount=-CORTAR_EXTRUIR8_DEPTH, mode=Mode.SUBTRACT)


solid = part_1.part
